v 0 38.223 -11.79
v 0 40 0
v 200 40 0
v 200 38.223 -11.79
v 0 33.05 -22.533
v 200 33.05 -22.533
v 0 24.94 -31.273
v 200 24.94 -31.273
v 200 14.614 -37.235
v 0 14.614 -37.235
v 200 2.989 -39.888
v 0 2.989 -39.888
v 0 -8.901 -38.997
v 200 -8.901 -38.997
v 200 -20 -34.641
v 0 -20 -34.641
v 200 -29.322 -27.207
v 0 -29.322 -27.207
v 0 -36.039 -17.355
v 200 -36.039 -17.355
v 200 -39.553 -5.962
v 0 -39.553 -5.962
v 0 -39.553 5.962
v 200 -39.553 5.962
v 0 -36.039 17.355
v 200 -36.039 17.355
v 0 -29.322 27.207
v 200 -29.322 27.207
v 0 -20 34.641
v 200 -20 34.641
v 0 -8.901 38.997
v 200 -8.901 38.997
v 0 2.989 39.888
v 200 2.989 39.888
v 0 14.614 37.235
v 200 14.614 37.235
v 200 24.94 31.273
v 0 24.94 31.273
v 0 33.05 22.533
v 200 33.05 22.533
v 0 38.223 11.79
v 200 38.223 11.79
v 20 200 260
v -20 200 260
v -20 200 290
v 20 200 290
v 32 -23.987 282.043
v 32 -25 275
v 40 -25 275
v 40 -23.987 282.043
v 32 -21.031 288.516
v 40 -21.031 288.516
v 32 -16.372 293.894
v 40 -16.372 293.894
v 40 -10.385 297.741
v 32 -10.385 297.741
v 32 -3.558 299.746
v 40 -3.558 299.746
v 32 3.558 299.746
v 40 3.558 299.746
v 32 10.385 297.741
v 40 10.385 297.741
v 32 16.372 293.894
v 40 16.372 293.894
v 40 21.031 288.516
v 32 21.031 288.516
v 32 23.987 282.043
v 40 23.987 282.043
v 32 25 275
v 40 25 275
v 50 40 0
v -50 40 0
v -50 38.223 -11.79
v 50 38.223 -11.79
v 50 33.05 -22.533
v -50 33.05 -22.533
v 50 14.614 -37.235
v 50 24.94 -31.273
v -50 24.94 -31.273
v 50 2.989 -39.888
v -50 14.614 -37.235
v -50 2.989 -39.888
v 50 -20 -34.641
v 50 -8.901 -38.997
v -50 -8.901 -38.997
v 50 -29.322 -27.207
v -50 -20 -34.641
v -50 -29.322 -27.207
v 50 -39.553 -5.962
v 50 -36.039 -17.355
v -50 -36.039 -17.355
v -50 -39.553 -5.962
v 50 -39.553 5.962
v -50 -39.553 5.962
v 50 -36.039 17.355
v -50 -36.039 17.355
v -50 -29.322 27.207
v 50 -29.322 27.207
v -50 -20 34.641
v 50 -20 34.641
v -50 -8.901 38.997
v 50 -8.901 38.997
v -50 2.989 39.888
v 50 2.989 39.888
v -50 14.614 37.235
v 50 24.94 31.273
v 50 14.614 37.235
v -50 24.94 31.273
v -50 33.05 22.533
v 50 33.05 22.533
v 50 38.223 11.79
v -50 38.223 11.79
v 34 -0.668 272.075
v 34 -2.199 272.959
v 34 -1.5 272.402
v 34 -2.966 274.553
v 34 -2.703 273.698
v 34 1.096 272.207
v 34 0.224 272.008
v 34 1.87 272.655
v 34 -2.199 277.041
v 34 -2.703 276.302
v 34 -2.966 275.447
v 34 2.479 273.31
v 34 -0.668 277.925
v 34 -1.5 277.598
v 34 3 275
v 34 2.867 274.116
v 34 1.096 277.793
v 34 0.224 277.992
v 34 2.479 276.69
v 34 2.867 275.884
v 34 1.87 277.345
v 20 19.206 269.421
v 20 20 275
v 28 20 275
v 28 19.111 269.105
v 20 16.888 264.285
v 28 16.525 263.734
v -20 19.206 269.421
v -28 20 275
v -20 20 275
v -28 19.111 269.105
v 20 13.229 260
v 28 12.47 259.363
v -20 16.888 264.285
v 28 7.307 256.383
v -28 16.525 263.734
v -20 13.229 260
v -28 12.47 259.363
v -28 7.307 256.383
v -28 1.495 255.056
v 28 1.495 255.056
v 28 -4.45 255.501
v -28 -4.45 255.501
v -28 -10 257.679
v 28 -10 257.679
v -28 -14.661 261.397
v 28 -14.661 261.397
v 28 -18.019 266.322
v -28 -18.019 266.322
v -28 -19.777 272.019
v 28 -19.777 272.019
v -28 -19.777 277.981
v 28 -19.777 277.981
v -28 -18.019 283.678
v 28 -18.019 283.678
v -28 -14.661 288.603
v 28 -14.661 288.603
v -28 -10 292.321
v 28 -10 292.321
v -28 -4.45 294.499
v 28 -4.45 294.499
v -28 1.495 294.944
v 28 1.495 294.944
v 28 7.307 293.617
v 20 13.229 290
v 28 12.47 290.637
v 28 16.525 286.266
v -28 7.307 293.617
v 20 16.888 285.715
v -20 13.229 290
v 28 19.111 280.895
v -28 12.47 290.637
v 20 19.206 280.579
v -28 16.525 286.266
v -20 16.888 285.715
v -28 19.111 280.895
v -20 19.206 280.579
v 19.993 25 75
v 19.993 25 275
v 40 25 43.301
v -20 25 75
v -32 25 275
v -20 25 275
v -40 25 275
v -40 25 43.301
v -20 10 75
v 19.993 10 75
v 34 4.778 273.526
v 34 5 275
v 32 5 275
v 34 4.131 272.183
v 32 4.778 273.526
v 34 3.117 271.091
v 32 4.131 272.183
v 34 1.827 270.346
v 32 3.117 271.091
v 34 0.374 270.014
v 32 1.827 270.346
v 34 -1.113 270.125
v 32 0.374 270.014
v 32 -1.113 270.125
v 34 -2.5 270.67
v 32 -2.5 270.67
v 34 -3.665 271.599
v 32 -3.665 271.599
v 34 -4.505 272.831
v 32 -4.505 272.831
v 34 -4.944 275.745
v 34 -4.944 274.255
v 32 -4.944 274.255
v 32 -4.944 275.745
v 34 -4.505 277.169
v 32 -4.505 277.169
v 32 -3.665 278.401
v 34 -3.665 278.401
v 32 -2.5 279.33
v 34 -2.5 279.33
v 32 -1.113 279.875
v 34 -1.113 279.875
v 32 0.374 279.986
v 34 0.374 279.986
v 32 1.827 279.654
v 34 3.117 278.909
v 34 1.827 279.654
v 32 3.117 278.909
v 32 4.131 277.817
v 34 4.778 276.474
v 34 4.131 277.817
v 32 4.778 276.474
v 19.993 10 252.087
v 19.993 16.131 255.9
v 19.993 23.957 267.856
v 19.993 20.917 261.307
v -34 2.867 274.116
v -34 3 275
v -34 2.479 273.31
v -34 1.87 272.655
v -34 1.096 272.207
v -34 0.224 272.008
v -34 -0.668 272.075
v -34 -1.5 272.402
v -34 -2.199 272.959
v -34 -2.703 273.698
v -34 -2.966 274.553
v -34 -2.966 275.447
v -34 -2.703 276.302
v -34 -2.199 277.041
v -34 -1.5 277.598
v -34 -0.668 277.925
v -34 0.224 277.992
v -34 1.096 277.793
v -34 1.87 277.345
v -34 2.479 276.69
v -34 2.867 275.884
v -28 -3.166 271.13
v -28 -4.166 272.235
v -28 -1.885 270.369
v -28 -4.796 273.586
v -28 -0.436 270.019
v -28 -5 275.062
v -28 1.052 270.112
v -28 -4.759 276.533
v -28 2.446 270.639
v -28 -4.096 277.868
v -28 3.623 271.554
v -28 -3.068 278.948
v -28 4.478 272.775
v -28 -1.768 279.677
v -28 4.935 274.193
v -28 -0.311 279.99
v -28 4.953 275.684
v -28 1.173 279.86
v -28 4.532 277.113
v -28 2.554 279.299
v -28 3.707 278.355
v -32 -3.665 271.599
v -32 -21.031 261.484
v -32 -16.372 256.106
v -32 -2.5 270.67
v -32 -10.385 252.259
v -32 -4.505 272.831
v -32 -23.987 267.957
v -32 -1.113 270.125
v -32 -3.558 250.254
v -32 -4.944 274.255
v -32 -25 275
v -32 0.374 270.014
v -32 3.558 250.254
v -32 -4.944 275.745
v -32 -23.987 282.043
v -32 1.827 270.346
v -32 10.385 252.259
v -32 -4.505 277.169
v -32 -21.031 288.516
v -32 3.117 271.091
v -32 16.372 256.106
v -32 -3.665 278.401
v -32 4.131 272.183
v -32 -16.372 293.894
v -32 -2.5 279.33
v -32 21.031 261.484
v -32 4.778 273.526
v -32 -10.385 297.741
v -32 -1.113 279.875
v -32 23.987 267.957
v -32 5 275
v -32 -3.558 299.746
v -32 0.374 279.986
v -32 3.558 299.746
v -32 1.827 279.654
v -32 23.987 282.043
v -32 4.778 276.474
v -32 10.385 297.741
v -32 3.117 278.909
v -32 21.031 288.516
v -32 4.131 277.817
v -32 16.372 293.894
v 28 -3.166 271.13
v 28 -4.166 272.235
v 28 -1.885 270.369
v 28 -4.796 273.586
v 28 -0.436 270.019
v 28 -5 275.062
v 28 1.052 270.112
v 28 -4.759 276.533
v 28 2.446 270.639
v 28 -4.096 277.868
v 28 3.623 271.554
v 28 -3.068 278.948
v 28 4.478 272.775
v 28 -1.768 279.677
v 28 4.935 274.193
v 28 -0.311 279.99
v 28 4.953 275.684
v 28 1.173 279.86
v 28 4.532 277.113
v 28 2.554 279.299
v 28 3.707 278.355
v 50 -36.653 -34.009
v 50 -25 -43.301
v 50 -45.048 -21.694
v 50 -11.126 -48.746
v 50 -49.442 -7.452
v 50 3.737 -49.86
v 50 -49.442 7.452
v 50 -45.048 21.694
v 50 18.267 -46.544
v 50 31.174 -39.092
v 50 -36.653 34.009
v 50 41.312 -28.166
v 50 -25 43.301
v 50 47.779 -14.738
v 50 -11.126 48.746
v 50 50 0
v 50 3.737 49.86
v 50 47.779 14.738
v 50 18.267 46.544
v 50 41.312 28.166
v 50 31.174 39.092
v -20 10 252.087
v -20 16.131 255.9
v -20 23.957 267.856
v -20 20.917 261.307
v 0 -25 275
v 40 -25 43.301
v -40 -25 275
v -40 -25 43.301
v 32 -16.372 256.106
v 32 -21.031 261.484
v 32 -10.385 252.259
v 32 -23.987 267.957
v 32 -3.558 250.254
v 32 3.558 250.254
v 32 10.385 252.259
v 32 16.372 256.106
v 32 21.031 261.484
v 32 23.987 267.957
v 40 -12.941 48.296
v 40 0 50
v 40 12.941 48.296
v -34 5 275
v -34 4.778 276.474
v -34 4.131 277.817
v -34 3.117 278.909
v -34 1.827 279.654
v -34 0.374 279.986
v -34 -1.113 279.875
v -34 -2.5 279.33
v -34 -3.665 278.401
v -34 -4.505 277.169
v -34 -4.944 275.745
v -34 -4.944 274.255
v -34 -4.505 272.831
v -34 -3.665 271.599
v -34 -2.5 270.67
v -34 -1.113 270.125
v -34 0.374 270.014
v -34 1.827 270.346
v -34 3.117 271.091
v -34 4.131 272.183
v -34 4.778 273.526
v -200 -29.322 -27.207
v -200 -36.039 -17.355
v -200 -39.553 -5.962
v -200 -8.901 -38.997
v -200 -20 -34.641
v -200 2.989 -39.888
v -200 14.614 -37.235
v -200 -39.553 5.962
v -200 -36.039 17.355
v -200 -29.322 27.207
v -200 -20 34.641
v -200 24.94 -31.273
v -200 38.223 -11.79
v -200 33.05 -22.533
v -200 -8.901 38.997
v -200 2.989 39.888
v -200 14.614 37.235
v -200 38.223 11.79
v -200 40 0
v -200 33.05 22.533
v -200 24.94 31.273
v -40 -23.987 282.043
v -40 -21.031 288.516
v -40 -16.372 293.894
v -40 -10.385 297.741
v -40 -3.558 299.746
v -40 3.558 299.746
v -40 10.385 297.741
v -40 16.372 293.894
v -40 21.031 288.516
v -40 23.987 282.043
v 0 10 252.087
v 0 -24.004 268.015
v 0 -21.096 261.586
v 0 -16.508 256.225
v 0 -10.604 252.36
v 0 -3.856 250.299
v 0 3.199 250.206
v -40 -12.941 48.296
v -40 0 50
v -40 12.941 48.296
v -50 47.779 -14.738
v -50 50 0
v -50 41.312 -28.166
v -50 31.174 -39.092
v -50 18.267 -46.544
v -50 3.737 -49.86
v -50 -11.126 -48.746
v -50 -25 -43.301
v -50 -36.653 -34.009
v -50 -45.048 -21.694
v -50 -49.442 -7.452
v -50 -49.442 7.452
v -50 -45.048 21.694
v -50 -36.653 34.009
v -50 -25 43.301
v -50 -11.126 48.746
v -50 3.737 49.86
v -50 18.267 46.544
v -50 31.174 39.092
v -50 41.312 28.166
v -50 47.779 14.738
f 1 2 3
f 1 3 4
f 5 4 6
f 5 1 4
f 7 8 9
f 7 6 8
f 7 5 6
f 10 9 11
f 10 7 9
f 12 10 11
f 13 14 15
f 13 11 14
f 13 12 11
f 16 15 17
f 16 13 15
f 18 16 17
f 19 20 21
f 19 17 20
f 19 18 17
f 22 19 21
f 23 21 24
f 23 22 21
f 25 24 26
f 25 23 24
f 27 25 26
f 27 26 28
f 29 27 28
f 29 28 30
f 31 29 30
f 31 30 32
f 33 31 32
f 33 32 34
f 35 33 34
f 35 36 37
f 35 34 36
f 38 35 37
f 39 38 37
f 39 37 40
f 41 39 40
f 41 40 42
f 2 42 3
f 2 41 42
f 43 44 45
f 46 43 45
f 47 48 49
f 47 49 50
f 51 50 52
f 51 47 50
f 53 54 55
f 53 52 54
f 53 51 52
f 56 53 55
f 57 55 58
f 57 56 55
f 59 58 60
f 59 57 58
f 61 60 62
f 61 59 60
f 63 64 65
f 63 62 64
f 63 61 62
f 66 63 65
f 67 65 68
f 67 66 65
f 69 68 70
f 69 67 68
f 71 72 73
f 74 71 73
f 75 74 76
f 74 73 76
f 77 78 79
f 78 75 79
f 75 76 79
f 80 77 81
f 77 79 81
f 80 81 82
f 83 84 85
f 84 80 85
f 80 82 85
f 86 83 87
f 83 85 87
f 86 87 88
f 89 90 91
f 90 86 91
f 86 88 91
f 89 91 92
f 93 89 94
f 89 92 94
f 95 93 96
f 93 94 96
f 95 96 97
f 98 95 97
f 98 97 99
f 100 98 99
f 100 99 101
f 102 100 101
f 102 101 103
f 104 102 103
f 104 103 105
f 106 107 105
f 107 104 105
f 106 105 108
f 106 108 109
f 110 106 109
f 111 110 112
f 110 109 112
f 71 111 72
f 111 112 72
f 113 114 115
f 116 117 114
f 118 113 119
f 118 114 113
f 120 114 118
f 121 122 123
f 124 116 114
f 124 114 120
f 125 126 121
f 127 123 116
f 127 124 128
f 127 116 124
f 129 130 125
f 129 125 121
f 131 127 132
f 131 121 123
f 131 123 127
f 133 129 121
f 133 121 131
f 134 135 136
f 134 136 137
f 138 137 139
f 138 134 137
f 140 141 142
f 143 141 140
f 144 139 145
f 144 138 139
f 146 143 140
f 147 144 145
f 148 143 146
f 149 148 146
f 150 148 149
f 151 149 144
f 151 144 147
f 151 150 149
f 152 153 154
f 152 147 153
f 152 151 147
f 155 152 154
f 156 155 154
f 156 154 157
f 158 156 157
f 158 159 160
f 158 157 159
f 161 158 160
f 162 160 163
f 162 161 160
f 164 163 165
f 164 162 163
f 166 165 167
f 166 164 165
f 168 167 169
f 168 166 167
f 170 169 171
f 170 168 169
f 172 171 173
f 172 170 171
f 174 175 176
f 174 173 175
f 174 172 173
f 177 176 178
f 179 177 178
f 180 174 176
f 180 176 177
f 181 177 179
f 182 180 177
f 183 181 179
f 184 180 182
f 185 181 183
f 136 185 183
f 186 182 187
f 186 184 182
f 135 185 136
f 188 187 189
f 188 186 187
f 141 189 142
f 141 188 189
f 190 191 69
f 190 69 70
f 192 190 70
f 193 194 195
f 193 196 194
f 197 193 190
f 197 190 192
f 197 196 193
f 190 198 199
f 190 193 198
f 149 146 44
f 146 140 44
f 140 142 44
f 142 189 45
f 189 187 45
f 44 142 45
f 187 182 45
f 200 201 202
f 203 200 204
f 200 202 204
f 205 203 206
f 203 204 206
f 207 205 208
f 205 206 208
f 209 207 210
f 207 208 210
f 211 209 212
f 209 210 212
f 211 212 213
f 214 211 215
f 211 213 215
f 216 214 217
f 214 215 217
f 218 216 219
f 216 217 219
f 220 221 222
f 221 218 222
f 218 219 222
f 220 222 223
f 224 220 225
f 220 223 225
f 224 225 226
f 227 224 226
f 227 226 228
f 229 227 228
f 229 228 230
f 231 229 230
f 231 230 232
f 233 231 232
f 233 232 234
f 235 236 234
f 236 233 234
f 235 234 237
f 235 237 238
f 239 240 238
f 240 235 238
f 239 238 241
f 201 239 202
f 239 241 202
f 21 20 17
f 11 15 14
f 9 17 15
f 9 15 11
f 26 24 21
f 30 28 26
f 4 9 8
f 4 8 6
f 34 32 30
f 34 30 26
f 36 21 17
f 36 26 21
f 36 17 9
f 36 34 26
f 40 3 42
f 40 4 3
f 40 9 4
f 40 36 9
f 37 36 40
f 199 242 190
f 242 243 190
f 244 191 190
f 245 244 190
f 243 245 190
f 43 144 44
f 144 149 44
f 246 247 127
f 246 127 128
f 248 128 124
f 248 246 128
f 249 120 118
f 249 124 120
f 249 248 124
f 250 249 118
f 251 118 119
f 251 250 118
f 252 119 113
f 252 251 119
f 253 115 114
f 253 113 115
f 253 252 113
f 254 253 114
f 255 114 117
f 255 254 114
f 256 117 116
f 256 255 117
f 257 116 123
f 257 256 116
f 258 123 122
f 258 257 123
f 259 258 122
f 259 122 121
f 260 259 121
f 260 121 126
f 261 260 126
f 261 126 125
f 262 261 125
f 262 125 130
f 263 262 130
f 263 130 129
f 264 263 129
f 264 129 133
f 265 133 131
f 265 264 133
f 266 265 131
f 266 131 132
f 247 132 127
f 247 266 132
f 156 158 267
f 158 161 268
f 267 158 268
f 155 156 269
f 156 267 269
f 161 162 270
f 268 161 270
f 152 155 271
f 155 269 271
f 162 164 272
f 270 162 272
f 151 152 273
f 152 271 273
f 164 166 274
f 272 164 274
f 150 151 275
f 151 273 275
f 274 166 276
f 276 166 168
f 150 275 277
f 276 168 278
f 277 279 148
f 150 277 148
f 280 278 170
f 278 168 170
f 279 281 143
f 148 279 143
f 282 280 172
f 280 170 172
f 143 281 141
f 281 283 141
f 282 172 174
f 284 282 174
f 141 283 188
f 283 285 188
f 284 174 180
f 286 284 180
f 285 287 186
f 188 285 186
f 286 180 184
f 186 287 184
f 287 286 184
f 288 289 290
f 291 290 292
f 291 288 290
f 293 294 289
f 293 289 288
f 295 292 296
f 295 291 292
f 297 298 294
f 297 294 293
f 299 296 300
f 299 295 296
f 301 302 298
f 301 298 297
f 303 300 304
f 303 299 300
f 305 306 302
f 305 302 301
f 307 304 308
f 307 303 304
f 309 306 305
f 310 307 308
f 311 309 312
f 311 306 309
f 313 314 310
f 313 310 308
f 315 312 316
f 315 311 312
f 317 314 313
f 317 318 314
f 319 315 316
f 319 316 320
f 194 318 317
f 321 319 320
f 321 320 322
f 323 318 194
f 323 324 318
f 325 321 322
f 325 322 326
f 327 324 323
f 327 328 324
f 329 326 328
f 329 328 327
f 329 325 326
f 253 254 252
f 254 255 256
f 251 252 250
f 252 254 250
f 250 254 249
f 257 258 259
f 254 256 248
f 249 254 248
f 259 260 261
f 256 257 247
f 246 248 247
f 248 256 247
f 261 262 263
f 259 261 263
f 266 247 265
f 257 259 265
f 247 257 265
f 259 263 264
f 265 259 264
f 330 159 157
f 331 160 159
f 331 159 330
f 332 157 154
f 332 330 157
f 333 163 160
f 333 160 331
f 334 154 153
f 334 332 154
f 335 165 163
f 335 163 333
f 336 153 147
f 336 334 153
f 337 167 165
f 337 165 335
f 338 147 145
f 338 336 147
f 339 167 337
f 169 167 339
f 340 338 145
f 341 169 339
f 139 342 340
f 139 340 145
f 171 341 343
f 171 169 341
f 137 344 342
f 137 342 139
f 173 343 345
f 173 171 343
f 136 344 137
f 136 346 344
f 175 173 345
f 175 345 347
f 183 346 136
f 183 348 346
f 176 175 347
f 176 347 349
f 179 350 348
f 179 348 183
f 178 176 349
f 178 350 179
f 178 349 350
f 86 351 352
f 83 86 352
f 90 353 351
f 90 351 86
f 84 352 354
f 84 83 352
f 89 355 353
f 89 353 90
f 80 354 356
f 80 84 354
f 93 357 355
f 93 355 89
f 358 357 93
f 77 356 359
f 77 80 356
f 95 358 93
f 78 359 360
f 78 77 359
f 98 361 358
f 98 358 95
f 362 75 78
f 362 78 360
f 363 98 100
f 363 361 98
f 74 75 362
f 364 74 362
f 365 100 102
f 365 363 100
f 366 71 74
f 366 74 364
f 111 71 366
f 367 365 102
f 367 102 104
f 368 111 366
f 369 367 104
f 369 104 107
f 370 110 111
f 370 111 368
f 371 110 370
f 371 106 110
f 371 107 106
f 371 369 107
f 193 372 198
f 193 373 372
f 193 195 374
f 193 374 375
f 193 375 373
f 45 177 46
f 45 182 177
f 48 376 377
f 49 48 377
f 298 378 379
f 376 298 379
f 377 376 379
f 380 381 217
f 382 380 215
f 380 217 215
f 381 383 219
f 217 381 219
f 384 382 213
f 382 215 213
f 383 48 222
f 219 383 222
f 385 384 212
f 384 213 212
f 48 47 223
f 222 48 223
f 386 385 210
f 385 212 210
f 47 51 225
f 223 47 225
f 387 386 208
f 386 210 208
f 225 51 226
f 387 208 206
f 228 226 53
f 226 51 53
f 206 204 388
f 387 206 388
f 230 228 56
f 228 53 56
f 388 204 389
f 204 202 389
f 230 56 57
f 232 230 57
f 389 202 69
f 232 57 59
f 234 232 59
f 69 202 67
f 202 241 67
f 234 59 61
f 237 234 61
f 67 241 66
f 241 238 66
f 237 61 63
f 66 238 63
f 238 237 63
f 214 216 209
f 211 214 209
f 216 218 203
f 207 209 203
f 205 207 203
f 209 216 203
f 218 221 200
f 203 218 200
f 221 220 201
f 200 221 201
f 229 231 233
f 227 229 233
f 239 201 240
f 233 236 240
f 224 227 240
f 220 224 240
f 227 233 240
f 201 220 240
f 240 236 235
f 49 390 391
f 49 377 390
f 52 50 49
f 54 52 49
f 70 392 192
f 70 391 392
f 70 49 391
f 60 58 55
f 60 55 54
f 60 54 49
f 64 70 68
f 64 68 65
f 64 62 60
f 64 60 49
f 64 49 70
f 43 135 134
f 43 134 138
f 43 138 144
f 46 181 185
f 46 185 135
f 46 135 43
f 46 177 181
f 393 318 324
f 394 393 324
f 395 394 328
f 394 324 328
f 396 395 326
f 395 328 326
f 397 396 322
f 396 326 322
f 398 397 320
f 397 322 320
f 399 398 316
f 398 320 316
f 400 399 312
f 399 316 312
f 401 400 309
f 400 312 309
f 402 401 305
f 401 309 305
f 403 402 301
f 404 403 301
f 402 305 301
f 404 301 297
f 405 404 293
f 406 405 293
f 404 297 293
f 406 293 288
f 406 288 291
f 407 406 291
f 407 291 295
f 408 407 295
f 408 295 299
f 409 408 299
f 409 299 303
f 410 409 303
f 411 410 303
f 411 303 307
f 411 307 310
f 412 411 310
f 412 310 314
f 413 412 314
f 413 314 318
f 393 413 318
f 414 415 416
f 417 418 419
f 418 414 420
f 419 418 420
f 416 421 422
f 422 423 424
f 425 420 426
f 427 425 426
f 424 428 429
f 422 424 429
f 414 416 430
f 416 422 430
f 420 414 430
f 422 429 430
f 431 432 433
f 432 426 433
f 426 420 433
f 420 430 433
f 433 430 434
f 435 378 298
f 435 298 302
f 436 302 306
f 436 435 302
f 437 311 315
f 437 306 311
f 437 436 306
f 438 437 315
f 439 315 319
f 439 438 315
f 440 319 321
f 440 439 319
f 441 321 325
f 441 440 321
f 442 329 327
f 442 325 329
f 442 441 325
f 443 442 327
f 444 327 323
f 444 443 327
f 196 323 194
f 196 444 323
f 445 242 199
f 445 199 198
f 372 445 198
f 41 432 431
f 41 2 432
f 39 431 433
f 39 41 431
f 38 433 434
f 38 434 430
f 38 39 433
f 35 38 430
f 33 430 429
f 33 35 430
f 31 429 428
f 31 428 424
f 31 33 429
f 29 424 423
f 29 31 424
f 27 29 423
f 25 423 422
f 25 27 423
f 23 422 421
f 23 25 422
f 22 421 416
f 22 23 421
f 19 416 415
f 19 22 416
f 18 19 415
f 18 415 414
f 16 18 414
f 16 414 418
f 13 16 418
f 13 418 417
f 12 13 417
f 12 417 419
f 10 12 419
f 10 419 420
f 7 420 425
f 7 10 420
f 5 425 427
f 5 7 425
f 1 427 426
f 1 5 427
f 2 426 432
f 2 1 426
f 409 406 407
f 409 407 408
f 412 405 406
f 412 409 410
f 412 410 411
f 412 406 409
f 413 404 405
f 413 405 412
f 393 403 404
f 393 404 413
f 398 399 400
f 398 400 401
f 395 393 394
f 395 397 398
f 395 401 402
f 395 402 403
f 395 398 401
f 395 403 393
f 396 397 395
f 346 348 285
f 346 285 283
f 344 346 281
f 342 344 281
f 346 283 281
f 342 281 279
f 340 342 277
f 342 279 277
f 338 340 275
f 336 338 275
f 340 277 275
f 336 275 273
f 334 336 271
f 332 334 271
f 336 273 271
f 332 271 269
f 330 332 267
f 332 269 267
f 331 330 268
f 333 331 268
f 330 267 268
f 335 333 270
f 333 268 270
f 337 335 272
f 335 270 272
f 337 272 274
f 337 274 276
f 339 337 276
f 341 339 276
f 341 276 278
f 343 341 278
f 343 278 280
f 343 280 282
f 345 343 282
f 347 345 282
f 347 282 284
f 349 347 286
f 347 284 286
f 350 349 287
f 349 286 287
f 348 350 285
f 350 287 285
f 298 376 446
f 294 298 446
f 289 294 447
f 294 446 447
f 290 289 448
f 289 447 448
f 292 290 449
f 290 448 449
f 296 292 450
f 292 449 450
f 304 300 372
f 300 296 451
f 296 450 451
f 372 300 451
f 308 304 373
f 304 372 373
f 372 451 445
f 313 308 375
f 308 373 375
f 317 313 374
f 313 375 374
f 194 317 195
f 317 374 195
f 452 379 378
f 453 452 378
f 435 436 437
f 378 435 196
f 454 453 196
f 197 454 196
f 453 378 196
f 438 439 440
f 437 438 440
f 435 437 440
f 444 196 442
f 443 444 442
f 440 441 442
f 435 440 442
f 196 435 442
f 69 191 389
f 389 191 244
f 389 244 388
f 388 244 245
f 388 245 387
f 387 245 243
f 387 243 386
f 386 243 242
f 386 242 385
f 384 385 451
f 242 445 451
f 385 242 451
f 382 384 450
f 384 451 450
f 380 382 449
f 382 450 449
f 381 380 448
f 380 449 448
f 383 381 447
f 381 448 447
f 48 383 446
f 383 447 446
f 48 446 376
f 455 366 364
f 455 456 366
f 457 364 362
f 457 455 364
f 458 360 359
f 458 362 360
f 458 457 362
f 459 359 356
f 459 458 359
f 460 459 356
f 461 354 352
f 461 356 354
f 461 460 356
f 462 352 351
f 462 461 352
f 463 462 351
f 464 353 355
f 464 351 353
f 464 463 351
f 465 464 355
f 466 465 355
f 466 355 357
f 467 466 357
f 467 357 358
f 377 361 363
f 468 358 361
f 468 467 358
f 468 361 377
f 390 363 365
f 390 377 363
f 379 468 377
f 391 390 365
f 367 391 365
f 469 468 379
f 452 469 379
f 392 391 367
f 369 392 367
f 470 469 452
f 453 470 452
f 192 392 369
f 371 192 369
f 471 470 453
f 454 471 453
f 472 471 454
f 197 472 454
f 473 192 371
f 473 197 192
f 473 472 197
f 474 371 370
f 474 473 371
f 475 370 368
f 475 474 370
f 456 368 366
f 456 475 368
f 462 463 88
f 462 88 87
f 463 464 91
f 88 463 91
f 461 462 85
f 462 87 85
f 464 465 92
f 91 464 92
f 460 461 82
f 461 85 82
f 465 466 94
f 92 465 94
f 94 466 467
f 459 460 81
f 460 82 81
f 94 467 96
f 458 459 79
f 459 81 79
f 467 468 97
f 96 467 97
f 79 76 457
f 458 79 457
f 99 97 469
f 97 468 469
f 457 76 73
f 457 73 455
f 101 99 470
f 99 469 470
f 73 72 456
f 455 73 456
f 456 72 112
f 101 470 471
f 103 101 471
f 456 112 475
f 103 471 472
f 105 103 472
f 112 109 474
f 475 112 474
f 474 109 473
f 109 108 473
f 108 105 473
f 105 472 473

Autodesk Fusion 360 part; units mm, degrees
sketch "Sketch1" plane through (0, 0, 0) normal (1, 0, 0) x (0, 1, 0)
  circle A0 centre (0, 0) radius 40
  dimension "d5" = 80
extrude "Extrude1" add sketch "Sketch1" along normal blind 200 and the other way blind 200 makes body 1 in component "Base Rod"
sketch "Sketch2" plane through (0, 0, 0) normal (1, 0, 0) x (0, 1, 0)
  circle A0 centre (0, 0) radius 50
  circle A1 centre (0, 0) radius 40
  dimension "d6" = 100
extrude "Extrude1'" add sketch "Sketch2" along normal blind 50 and the other way blind 50 separate body makes body 2 in component "Arm 1"
sketch "Sketch3" plane through (0, 0, 0) normal (1, 0, 0) x (0, 1, 0)
  line L0 (0, 50) -> (0, 275)
  circle A0 centre (0, 275) radius 25
  line L1 (0, 275) -> (-60, 275)
  line L2 (-60, 275) -> (60, 275)
  line L3 (-25, 275) -> (-25, 43.3013)
  line L4 (25, 275) -> (25, 43.3013)
  circle A1 centre (0, 0) radius 50
  dimension "d19" = 225
  dimension "d20" = 50
extrude "Extrude2" add sketch "Sketch3" along normal blind 40 and the other way blind 40 contours L0 A0 L3 A1 | L0 A0 L4 A1 | L0 A0 L1 L2 | L0 A0 L2 | A0 L1 L2 bodies 2 in component "Arm 1"
sketch "Sketch4" plane through (0, 0, 0) normal (1, 0, 0) x (0, 1, 0)
  line L0 (0, 50) -> (0, 275) construction
  circle A0 centre (0, 275) radius 25
  dimension "d25" = 225
  dimension "d26" = 50
extrude "Extrude3" cut sketch "Sketch4" along normal blind 32 and the other way blind 32 bodies 2 in component "Arm 1"
sketch "Sketch5" plane through (0, 0, 0) normal (1, 0, 0) x (0, 1, 0)
  line L0 (0, 50) -> (0, 275) construction
  circle A0 centre (0, 275) radius 20
  dimension "d31" = 225
  dimension "d32" = 40
extrude "Extrude1''" add sketch "Sketch5" along normal blind 28 and the other way blind 28 separate body makes body 3 in component "Arm 2"
sketch "Sketch6" plane through (0, 0, 0) normal (1, 0, 0) x (0, 1, 0)
  line L0 (0, 295) -> (0, 290) construction
  line L1 (13.0091, 290) -> (200, 290)
  line L2 (0, 255) -> (0, 260) construction
  line L3 (13.0091, 260) -> (200, 260)
  line L4 (200, 260) -> (200, 290)
  circle A0 centre (0, 275) radius 19.8554
  dimension "d41" = 5
  dimension "d42" = 200
  dimension "d43" = 5
  dimension "d44" = 200
extrude "Extrude2'" add sketch "Sketch6" along normal blind 20 and the other way blind 20 contours L1 L3 L4 A0 bodies 3 in component "Arm 2"
sketch "Sketch7" plane through (0, 25, 0) normal (0, 1, 0) x (-1, 0, 0)
  line L0 (40, 275) -> (32, 275)
  line L1 (32, 275) -> (-32, 275)
  line L2 (-32, 275) -> (-40, 275)
  line L3 (-40, 275) -> (-40, 43.3013)
  line L4 (-40, 43.3013) -> (40, 43.3013)
  line L5 (40, 43.3013) -> (40, 275)
  line L6 (-19.9929, 275) -> (-19.9929, 75)
  line L7 (20, 275) -> (20, 75)
  line L8 (20, 75) -> (-19.9929, 75)
  dimension "d49" = 200
  dimension "d50" = 200
extrude "Extrude3'" [suppressed] in component "Arm 2"
extrude "Extrude4" cut sketch "Sketch7" along normal blind -15 and the other way blind -20 contours L1 L6 L7 L8 bodies 2 in component "Arm 1"
sketch "Sketch8" plane through (-32, 0, 0) normal (1, 0, 0) x (0, 1, 0)
  arc A0 (25, 275) -> (-25, 275) centre (0, 275) ccw
  arc A1 (-25, 275) -> (25, 275) centre (0, 275) ccw
  circle A2 centre (0, 275) radius 5
extrude "Extrude5" cut sketch "Sketch8" along normal blind 66 and the other way blind 2 contours A2 bodies 2 in component "Arm 1"
extrude "Extrude4'" cut sketch "Sketch8" along normal blind 66 and the other way blind 2 contours A2 sketch seen with x (1, 0, 0) y (0, 0.906308, 0.422618) z (0, -0.422618, 0.906308) at (0, 116.22, 25.7654) bodies 3 in component "Arm 2"
sketch "Sketch9" plane through (-34, 0, 0) normal (1, 0, 0) x (0, 1, 0)
  circle A0 centre (0, 275) radius 5
  circle A1 centre (0, 275) radius 3
extrude "Extrude1'''" add sketch "Sketch9" along normal up to surface (68 mm away) separate body contours A1 makes body 4 in component "Component"
component "Base Rod" placed x (1, 0, 0) y (0, 1, 0) z (0, 0, 1) at (0, 0, 0)
component "Arm 1" placed x (1, 0, 0) y (0, 1, 0) z (0, 0, 1) at (0, 0, 0)
component "Arm 2" placed x (1, 0, 0) y (0, 1, 0) z (0, 0, 1) at (0, 0, 0)
component "Component" placed x (1, 0, 0) y (0, 1, 0) z (0, 0, 1) at (0, 0, 0)
